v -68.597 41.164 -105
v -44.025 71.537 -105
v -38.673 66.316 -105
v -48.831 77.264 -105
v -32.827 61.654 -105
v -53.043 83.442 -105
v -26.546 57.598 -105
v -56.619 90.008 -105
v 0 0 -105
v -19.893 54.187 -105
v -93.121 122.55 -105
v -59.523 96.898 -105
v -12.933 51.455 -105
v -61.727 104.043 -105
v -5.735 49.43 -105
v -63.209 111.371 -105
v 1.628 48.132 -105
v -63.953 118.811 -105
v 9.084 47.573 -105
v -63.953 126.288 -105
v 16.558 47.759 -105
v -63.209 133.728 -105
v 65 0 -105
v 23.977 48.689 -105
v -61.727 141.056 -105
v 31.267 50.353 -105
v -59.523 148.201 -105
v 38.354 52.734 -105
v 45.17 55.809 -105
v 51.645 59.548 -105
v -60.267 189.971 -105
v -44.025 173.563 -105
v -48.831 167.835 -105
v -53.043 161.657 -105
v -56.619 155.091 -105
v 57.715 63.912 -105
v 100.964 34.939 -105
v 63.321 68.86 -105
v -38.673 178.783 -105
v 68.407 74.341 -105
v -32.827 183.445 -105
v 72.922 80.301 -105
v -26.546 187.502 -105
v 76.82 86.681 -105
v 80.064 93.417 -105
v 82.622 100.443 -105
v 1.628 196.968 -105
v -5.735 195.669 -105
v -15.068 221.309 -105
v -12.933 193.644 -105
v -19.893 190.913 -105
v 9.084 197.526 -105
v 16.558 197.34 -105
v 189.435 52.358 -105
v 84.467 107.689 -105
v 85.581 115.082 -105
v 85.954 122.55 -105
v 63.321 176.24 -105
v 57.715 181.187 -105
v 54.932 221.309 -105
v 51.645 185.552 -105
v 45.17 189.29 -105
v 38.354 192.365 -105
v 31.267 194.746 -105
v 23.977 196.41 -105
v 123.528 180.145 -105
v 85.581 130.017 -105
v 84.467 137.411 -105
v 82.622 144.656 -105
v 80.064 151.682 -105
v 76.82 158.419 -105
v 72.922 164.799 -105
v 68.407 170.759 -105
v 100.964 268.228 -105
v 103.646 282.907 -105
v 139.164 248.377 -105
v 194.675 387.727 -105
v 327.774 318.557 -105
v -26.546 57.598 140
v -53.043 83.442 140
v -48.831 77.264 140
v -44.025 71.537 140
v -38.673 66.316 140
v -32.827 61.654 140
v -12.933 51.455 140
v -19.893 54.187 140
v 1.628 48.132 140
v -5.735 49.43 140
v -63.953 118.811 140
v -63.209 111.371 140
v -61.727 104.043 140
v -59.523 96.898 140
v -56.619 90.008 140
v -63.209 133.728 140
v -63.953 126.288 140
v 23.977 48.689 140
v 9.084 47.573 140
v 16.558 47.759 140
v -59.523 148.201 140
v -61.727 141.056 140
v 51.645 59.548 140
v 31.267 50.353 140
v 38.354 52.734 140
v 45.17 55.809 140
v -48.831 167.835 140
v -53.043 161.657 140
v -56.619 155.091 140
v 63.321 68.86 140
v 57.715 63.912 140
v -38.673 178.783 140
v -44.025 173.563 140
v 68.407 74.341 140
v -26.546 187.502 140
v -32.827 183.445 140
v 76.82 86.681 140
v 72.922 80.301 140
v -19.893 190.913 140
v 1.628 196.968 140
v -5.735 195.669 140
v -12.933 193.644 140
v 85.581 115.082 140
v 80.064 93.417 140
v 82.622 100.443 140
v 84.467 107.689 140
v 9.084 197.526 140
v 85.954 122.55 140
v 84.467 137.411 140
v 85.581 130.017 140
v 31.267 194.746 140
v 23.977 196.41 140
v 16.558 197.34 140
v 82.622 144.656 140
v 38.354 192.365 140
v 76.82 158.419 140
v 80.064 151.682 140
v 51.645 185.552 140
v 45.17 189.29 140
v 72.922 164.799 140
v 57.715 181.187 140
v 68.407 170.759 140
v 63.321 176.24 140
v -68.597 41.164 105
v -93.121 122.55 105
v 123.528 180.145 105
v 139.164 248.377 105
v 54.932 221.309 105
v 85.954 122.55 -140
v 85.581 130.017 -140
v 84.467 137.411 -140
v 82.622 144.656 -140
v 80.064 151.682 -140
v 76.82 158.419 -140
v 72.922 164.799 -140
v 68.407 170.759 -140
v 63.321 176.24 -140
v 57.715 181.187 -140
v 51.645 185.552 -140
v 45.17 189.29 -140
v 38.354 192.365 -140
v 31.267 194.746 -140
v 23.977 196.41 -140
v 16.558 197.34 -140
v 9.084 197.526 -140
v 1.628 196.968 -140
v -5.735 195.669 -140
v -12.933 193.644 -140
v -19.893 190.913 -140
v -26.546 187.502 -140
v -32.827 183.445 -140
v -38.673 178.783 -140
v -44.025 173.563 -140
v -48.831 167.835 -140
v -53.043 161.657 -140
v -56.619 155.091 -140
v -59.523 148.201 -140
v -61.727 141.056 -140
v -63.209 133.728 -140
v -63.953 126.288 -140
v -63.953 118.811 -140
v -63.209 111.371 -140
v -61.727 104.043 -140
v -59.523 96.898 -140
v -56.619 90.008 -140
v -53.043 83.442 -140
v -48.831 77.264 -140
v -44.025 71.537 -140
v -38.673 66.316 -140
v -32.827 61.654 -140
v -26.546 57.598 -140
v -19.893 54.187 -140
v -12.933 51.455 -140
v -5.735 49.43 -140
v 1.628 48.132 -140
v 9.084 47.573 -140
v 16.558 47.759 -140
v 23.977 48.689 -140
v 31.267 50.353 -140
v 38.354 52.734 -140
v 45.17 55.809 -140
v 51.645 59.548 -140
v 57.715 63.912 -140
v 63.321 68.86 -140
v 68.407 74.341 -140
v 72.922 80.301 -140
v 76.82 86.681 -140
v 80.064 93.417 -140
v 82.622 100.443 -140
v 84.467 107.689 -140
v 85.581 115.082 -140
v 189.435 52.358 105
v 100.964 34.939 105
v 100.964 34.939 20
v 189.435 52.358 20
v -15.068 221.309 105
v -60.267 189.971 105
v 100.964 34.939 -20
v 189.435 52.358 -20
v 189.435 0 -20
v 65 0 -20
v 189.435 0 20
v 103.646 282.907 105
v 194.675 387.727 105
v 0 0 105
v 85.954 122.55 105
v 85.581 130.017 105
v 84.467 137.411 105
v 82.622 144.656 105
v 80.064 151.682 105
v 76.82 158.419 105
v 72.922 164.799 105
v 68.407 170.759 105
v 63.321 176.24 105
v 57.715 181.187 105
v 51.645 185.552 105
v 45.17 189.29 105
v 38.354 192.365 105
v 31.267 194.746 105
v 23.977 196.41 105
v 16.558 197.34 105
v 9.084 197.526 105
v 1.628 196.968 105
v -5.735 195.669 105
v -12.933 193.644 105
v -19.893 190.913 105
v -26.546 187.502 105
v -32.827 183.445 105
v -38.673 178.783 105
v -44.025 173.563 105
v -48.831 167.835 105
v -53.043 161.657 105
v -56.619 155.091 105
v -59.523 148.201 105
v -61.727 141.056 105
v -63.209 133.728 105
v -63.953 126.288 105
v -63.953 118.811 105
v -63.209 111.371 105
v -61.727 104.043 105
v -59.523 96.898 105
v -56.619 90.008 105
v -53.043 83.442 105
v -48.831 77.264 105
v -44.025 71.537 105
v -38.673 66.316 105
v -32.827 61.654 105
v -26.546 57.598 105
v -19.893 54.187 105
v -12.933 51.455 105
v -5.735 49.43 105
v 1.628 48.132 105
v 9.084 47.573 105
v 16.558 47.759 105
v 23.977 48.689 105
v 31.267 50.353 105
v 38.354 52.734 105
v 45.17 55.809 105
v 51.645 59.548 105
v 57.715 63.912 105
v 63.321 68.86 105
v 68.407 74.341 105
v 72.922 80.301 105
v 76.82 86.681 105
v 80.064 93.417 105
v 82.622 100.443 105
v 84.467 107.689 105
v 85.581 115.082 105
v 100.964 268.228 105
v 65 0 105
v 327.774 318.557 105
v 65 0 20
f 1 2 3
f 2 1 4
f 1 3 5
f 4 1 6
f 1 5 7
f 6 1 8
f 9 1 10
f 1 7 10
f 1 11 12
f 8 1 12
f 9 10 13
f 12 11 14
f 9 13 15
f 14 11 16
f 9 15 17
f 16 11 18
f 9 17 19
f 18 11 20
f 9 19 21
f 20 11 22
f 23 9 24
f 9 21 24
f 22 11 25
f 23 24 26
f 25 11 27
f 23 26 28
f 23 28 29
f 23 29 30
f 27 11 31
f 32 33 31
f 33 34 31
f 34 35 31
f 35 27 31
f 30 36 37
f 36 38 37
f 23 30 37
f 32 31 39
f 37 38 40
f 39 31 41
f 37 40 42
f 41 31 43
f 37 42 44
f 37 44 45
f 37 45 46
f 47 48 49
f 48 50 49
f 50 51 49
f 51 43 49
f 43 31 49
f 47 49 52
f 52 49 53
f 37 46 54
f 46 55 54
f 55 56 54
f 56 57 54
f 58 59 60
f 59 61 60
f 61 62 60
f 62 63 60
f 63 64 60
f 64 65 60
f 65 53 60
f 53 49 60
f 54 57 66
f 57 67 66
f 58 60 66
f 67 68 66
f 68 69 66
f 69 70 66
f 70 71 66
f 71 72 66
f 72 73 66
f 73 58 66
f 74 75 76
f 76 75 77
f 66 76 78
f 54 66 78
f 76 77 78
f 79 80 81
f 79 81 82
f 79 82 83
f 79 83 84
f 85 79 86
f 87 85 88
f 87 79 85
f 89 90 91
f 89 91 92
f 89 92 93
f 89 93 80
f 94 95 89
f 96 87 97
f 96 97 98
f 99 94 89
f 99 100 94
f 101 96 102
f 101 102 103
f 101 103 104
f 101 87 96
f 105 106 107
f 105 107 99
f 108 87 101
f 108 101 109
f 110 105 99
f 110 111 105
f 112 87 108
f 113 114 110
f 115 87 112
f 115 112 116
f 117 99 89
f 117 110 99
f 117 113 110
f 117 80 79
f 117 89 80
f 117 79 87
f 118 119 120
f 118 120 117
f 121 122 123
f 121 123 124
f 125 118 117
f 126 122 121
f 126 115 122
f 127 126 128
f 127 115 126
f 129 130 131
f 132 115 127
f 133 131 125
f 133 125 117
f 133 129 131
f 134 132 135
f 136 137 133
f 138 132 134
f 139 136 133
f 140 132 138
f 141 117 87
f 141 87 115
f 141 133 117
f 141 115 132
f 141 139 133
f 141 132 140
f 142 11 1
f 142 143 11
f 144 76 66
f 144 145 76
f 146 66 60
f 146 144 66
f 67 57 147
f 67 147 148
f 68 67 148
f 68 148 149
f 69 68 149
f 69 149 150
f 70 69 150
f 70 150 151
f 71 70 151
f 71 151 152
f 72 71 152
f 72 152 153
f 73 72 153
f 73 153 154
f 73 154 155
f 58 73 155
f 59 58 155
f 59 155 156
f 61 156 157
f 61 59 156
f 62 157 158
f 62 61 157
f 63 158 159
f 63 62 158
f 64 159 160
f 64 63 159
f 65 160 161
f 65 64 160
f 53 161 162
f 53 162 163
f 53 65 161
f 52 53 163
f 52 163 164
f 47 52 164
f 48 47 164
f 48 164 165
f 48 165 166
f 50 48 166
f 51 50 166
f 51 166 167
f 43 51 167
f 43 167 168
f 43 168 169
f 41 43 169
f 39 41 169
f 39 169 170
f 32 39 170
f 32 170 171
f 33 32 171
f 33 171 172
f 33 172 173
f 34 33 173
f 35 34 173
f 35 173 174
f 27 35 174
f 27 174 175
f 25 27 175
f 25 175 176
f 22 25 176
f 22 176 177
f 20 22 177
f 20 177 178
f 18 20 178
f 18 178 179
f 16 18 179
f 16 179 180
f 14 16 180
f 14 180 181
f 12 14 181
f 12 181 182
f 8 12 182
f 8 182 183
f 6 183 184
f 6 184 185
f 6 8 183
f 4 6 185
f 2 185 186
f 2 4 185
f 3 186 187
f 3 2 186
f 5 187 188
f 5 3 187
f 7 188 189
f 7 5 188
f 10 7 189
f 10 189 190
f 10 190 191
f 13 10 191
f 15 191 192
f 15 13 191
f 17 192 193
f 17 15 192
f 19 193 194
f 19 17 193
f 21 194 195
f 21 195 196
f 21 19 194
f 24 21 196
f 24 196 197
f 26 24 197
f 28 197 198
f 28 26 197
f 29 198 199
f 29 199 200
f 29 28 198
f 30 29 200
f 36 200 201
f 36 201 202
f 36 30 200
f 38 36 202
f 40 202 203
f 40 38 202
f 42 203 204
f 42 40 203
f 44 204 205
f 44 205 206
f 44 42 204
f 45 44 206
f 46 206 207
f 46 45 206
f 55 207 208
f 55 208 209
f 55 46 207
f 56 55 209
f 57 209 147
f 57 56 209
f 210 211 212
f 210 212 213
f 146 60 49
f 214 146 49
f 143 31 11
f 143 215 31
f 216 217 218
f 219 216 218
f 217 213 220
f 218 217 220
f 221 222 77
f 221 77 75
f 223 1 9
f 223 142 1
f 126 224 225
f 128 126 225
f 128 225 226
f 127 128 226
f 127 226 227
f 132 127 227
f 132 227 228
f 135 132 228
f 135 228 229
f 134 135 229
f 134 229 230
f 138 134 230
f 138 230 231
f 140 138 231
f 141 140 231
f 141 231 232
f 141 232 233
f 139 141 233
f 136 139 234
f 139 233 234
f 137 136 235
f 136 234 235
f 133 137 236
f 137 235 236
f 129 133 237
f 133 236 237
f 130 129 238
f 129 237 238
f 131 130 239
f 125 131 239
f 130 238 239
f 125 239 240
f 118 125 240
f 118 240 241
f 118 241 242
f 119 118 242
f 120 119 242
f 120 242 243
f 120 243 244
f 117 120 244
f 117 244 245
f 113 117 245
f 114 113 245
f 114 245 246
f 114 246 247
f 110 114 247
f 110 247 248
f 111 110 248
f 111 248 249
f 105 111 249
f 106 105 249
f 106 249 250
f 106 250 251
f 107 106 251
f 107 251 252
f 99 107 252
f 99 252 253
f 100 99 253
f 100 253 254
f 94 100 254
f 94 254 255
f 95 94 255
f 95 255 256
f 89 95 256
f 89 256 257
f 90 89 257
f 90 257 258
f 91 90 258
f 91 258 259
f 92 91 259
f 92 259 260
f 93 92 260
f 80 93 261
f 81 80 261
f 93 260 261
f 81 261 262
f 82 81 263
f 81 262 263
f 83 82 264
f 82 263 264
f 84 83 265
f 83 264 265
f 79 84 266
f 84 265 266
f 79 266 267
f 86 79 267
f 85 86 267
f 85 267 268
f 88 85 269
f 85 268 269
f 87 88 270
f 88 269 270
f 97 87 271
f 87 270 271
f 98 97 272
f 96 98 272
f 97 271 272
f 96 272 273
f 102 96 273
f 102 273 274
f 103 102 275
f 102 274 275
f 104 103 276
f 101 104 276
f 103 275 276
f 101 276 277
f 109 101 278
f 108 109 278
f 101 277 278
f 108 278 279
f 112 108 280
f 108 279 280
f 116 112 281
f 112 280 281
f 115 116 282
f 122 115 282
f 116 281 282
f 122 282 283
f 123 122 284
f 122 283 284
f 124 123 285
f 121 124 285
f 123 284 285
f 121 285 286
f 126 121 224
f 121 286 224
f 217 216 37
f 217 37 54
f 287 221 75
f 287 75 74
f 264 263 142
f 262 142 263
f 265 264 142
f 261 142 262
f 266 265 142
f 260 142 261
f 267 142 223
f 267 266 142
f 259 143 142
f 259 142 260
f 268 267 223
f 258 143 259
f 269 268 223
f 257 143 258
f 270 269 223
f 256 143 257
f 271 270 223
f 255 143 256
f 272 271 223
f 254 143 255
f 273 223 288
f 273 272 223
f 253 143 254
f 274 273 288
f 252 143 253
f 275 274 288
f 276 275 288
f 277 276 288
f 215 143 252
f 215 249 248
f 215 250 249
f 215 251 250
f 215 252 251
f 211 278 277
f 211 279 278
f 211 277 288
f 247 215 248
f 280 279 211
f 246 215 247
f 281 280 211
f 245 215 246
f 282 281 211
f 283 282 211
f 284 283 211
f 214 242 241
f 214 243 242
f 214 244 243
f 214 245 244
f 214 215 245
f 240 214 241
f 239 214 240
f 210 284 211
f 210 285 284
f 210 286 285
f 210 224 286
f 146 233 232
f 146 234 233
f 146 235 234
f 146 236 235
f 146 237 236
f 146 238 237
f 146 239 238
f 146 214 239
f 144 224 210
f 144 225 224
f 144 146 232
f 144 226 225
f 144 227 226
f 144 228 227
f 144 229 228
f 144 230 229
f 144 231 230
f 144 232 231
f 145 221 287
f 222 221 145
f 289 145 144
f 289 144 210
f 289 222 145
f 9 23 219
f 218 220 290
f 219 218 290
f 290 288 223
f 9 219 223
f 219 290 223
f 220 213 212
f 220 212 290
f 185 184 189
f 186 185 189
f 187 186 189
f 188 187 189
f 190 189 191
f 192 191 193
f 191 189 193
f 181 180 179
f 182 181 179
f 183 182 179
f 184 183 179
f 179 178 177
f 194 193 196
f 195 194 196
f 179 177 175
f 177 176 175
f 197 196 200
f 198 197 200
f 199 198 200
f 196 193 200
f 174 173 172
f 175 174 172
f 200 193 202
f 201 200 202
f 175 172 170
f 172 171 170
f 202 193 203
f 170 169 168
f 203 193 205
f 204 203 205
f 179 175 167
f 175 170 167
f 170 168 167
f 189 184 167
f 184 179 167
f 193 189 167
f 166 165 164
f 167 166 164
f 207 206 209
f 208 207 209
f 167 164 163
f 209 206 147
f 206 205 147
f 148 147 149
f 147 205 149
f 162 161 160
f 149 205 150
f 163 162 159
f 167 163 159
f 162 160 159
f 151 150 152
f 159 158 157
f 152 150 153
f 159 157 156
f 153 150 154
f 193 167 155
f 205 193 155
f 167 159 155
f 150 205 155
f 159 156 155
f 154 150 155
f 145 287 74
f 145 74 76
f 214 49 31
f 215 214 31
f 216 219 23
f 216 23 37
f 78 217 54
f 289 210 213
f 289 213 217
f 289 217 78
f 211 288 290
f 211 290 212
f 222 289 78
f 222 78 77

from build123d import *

# Parameters (mm, degrees)
BOSS_EXTRU_1_DEPTH      = 105
BOSS_EXTRU_1_DEPTH_BACK = 105
ESQUISSE1_R             = 75
BOSS_EXTRU_2_DEPTH      = 20
BOSS_EXTRU_2_DEPTH_BACK = 20
BOSS_EXTRU_3_DEPTH      = 140
BOSS_EXTRU_3_DEPTH_BACK = 140
ESQUISSE1_4_R           = 75


with BuildPart() as part:
    # Esquisse1 → Boss.-Extru.1 (new, two sides: drawn at the far end of the back side and taken through both)
    with BuildSketch(Plane.XY.offset(-BOSS_EXTRU_1_DEPTH_BACK)):
        Polygon((-68.596637727, 41.164320625), (0, 0), (65, 0), (100.963541268, 34.939277283), (189.435353132, 52.357657653), (327.774435506, 318.557391477), (194.674568594, 387.726932664), (103.646308232, 282.906907711), (100.963541268, 268.22841359), (139.16368684, 248.376503864), (123.528365835, 180.14501013), (54.931728108, 221.309330755), (-15.068271892, 221.309330755), (-60.266641359, 189.970737975), (-93.12076123, 122.549622532), align=None)
        with Locations((10.953732474, 122.549622532)):
            Circle(ESQUISSE1_R, mode=Mode.SUBTRACT)
    extrude(amount=BOSS_EXTRU_1_DEPTH + BOSS_EXTRU_1_DEPTH_BACK)

    # Esquisse1<3> → Boss.-Extru.2 (add, two sides: drawn at the far end of the back side and taken through both)
    with BuildSketch(Plane.XY.offset(-BOSS_EXTRU_2_DEPTH_BACK)):
        Polygon((100.963541268, 34.939277283), (65, 0), (189.435353132, 0), (189.435353132, 52.357657653), align=None)
    extrude(amount=BOSS_EXTRU_2_DEPTH + BOSS_EXTRU_2_DEPTH_BACK)

    # Esquisse1<4> → Boss.-Extru.3 (add, two sides: drawn at the far end of the back side and taken through both)
    with BuildSketch(Plane.XY.offset(-BOSS_EXTRU_3_DEPTH_BACK)):
        with Locations((10.953732474, 122.549622532)):
            Circle(ESQUISSE1_4_R)
    extrude(amount=BOSS_EXTRU_3_DEPTH + BOSS_EXTRU_3_DEPTH_BACK)


solid = part.part
